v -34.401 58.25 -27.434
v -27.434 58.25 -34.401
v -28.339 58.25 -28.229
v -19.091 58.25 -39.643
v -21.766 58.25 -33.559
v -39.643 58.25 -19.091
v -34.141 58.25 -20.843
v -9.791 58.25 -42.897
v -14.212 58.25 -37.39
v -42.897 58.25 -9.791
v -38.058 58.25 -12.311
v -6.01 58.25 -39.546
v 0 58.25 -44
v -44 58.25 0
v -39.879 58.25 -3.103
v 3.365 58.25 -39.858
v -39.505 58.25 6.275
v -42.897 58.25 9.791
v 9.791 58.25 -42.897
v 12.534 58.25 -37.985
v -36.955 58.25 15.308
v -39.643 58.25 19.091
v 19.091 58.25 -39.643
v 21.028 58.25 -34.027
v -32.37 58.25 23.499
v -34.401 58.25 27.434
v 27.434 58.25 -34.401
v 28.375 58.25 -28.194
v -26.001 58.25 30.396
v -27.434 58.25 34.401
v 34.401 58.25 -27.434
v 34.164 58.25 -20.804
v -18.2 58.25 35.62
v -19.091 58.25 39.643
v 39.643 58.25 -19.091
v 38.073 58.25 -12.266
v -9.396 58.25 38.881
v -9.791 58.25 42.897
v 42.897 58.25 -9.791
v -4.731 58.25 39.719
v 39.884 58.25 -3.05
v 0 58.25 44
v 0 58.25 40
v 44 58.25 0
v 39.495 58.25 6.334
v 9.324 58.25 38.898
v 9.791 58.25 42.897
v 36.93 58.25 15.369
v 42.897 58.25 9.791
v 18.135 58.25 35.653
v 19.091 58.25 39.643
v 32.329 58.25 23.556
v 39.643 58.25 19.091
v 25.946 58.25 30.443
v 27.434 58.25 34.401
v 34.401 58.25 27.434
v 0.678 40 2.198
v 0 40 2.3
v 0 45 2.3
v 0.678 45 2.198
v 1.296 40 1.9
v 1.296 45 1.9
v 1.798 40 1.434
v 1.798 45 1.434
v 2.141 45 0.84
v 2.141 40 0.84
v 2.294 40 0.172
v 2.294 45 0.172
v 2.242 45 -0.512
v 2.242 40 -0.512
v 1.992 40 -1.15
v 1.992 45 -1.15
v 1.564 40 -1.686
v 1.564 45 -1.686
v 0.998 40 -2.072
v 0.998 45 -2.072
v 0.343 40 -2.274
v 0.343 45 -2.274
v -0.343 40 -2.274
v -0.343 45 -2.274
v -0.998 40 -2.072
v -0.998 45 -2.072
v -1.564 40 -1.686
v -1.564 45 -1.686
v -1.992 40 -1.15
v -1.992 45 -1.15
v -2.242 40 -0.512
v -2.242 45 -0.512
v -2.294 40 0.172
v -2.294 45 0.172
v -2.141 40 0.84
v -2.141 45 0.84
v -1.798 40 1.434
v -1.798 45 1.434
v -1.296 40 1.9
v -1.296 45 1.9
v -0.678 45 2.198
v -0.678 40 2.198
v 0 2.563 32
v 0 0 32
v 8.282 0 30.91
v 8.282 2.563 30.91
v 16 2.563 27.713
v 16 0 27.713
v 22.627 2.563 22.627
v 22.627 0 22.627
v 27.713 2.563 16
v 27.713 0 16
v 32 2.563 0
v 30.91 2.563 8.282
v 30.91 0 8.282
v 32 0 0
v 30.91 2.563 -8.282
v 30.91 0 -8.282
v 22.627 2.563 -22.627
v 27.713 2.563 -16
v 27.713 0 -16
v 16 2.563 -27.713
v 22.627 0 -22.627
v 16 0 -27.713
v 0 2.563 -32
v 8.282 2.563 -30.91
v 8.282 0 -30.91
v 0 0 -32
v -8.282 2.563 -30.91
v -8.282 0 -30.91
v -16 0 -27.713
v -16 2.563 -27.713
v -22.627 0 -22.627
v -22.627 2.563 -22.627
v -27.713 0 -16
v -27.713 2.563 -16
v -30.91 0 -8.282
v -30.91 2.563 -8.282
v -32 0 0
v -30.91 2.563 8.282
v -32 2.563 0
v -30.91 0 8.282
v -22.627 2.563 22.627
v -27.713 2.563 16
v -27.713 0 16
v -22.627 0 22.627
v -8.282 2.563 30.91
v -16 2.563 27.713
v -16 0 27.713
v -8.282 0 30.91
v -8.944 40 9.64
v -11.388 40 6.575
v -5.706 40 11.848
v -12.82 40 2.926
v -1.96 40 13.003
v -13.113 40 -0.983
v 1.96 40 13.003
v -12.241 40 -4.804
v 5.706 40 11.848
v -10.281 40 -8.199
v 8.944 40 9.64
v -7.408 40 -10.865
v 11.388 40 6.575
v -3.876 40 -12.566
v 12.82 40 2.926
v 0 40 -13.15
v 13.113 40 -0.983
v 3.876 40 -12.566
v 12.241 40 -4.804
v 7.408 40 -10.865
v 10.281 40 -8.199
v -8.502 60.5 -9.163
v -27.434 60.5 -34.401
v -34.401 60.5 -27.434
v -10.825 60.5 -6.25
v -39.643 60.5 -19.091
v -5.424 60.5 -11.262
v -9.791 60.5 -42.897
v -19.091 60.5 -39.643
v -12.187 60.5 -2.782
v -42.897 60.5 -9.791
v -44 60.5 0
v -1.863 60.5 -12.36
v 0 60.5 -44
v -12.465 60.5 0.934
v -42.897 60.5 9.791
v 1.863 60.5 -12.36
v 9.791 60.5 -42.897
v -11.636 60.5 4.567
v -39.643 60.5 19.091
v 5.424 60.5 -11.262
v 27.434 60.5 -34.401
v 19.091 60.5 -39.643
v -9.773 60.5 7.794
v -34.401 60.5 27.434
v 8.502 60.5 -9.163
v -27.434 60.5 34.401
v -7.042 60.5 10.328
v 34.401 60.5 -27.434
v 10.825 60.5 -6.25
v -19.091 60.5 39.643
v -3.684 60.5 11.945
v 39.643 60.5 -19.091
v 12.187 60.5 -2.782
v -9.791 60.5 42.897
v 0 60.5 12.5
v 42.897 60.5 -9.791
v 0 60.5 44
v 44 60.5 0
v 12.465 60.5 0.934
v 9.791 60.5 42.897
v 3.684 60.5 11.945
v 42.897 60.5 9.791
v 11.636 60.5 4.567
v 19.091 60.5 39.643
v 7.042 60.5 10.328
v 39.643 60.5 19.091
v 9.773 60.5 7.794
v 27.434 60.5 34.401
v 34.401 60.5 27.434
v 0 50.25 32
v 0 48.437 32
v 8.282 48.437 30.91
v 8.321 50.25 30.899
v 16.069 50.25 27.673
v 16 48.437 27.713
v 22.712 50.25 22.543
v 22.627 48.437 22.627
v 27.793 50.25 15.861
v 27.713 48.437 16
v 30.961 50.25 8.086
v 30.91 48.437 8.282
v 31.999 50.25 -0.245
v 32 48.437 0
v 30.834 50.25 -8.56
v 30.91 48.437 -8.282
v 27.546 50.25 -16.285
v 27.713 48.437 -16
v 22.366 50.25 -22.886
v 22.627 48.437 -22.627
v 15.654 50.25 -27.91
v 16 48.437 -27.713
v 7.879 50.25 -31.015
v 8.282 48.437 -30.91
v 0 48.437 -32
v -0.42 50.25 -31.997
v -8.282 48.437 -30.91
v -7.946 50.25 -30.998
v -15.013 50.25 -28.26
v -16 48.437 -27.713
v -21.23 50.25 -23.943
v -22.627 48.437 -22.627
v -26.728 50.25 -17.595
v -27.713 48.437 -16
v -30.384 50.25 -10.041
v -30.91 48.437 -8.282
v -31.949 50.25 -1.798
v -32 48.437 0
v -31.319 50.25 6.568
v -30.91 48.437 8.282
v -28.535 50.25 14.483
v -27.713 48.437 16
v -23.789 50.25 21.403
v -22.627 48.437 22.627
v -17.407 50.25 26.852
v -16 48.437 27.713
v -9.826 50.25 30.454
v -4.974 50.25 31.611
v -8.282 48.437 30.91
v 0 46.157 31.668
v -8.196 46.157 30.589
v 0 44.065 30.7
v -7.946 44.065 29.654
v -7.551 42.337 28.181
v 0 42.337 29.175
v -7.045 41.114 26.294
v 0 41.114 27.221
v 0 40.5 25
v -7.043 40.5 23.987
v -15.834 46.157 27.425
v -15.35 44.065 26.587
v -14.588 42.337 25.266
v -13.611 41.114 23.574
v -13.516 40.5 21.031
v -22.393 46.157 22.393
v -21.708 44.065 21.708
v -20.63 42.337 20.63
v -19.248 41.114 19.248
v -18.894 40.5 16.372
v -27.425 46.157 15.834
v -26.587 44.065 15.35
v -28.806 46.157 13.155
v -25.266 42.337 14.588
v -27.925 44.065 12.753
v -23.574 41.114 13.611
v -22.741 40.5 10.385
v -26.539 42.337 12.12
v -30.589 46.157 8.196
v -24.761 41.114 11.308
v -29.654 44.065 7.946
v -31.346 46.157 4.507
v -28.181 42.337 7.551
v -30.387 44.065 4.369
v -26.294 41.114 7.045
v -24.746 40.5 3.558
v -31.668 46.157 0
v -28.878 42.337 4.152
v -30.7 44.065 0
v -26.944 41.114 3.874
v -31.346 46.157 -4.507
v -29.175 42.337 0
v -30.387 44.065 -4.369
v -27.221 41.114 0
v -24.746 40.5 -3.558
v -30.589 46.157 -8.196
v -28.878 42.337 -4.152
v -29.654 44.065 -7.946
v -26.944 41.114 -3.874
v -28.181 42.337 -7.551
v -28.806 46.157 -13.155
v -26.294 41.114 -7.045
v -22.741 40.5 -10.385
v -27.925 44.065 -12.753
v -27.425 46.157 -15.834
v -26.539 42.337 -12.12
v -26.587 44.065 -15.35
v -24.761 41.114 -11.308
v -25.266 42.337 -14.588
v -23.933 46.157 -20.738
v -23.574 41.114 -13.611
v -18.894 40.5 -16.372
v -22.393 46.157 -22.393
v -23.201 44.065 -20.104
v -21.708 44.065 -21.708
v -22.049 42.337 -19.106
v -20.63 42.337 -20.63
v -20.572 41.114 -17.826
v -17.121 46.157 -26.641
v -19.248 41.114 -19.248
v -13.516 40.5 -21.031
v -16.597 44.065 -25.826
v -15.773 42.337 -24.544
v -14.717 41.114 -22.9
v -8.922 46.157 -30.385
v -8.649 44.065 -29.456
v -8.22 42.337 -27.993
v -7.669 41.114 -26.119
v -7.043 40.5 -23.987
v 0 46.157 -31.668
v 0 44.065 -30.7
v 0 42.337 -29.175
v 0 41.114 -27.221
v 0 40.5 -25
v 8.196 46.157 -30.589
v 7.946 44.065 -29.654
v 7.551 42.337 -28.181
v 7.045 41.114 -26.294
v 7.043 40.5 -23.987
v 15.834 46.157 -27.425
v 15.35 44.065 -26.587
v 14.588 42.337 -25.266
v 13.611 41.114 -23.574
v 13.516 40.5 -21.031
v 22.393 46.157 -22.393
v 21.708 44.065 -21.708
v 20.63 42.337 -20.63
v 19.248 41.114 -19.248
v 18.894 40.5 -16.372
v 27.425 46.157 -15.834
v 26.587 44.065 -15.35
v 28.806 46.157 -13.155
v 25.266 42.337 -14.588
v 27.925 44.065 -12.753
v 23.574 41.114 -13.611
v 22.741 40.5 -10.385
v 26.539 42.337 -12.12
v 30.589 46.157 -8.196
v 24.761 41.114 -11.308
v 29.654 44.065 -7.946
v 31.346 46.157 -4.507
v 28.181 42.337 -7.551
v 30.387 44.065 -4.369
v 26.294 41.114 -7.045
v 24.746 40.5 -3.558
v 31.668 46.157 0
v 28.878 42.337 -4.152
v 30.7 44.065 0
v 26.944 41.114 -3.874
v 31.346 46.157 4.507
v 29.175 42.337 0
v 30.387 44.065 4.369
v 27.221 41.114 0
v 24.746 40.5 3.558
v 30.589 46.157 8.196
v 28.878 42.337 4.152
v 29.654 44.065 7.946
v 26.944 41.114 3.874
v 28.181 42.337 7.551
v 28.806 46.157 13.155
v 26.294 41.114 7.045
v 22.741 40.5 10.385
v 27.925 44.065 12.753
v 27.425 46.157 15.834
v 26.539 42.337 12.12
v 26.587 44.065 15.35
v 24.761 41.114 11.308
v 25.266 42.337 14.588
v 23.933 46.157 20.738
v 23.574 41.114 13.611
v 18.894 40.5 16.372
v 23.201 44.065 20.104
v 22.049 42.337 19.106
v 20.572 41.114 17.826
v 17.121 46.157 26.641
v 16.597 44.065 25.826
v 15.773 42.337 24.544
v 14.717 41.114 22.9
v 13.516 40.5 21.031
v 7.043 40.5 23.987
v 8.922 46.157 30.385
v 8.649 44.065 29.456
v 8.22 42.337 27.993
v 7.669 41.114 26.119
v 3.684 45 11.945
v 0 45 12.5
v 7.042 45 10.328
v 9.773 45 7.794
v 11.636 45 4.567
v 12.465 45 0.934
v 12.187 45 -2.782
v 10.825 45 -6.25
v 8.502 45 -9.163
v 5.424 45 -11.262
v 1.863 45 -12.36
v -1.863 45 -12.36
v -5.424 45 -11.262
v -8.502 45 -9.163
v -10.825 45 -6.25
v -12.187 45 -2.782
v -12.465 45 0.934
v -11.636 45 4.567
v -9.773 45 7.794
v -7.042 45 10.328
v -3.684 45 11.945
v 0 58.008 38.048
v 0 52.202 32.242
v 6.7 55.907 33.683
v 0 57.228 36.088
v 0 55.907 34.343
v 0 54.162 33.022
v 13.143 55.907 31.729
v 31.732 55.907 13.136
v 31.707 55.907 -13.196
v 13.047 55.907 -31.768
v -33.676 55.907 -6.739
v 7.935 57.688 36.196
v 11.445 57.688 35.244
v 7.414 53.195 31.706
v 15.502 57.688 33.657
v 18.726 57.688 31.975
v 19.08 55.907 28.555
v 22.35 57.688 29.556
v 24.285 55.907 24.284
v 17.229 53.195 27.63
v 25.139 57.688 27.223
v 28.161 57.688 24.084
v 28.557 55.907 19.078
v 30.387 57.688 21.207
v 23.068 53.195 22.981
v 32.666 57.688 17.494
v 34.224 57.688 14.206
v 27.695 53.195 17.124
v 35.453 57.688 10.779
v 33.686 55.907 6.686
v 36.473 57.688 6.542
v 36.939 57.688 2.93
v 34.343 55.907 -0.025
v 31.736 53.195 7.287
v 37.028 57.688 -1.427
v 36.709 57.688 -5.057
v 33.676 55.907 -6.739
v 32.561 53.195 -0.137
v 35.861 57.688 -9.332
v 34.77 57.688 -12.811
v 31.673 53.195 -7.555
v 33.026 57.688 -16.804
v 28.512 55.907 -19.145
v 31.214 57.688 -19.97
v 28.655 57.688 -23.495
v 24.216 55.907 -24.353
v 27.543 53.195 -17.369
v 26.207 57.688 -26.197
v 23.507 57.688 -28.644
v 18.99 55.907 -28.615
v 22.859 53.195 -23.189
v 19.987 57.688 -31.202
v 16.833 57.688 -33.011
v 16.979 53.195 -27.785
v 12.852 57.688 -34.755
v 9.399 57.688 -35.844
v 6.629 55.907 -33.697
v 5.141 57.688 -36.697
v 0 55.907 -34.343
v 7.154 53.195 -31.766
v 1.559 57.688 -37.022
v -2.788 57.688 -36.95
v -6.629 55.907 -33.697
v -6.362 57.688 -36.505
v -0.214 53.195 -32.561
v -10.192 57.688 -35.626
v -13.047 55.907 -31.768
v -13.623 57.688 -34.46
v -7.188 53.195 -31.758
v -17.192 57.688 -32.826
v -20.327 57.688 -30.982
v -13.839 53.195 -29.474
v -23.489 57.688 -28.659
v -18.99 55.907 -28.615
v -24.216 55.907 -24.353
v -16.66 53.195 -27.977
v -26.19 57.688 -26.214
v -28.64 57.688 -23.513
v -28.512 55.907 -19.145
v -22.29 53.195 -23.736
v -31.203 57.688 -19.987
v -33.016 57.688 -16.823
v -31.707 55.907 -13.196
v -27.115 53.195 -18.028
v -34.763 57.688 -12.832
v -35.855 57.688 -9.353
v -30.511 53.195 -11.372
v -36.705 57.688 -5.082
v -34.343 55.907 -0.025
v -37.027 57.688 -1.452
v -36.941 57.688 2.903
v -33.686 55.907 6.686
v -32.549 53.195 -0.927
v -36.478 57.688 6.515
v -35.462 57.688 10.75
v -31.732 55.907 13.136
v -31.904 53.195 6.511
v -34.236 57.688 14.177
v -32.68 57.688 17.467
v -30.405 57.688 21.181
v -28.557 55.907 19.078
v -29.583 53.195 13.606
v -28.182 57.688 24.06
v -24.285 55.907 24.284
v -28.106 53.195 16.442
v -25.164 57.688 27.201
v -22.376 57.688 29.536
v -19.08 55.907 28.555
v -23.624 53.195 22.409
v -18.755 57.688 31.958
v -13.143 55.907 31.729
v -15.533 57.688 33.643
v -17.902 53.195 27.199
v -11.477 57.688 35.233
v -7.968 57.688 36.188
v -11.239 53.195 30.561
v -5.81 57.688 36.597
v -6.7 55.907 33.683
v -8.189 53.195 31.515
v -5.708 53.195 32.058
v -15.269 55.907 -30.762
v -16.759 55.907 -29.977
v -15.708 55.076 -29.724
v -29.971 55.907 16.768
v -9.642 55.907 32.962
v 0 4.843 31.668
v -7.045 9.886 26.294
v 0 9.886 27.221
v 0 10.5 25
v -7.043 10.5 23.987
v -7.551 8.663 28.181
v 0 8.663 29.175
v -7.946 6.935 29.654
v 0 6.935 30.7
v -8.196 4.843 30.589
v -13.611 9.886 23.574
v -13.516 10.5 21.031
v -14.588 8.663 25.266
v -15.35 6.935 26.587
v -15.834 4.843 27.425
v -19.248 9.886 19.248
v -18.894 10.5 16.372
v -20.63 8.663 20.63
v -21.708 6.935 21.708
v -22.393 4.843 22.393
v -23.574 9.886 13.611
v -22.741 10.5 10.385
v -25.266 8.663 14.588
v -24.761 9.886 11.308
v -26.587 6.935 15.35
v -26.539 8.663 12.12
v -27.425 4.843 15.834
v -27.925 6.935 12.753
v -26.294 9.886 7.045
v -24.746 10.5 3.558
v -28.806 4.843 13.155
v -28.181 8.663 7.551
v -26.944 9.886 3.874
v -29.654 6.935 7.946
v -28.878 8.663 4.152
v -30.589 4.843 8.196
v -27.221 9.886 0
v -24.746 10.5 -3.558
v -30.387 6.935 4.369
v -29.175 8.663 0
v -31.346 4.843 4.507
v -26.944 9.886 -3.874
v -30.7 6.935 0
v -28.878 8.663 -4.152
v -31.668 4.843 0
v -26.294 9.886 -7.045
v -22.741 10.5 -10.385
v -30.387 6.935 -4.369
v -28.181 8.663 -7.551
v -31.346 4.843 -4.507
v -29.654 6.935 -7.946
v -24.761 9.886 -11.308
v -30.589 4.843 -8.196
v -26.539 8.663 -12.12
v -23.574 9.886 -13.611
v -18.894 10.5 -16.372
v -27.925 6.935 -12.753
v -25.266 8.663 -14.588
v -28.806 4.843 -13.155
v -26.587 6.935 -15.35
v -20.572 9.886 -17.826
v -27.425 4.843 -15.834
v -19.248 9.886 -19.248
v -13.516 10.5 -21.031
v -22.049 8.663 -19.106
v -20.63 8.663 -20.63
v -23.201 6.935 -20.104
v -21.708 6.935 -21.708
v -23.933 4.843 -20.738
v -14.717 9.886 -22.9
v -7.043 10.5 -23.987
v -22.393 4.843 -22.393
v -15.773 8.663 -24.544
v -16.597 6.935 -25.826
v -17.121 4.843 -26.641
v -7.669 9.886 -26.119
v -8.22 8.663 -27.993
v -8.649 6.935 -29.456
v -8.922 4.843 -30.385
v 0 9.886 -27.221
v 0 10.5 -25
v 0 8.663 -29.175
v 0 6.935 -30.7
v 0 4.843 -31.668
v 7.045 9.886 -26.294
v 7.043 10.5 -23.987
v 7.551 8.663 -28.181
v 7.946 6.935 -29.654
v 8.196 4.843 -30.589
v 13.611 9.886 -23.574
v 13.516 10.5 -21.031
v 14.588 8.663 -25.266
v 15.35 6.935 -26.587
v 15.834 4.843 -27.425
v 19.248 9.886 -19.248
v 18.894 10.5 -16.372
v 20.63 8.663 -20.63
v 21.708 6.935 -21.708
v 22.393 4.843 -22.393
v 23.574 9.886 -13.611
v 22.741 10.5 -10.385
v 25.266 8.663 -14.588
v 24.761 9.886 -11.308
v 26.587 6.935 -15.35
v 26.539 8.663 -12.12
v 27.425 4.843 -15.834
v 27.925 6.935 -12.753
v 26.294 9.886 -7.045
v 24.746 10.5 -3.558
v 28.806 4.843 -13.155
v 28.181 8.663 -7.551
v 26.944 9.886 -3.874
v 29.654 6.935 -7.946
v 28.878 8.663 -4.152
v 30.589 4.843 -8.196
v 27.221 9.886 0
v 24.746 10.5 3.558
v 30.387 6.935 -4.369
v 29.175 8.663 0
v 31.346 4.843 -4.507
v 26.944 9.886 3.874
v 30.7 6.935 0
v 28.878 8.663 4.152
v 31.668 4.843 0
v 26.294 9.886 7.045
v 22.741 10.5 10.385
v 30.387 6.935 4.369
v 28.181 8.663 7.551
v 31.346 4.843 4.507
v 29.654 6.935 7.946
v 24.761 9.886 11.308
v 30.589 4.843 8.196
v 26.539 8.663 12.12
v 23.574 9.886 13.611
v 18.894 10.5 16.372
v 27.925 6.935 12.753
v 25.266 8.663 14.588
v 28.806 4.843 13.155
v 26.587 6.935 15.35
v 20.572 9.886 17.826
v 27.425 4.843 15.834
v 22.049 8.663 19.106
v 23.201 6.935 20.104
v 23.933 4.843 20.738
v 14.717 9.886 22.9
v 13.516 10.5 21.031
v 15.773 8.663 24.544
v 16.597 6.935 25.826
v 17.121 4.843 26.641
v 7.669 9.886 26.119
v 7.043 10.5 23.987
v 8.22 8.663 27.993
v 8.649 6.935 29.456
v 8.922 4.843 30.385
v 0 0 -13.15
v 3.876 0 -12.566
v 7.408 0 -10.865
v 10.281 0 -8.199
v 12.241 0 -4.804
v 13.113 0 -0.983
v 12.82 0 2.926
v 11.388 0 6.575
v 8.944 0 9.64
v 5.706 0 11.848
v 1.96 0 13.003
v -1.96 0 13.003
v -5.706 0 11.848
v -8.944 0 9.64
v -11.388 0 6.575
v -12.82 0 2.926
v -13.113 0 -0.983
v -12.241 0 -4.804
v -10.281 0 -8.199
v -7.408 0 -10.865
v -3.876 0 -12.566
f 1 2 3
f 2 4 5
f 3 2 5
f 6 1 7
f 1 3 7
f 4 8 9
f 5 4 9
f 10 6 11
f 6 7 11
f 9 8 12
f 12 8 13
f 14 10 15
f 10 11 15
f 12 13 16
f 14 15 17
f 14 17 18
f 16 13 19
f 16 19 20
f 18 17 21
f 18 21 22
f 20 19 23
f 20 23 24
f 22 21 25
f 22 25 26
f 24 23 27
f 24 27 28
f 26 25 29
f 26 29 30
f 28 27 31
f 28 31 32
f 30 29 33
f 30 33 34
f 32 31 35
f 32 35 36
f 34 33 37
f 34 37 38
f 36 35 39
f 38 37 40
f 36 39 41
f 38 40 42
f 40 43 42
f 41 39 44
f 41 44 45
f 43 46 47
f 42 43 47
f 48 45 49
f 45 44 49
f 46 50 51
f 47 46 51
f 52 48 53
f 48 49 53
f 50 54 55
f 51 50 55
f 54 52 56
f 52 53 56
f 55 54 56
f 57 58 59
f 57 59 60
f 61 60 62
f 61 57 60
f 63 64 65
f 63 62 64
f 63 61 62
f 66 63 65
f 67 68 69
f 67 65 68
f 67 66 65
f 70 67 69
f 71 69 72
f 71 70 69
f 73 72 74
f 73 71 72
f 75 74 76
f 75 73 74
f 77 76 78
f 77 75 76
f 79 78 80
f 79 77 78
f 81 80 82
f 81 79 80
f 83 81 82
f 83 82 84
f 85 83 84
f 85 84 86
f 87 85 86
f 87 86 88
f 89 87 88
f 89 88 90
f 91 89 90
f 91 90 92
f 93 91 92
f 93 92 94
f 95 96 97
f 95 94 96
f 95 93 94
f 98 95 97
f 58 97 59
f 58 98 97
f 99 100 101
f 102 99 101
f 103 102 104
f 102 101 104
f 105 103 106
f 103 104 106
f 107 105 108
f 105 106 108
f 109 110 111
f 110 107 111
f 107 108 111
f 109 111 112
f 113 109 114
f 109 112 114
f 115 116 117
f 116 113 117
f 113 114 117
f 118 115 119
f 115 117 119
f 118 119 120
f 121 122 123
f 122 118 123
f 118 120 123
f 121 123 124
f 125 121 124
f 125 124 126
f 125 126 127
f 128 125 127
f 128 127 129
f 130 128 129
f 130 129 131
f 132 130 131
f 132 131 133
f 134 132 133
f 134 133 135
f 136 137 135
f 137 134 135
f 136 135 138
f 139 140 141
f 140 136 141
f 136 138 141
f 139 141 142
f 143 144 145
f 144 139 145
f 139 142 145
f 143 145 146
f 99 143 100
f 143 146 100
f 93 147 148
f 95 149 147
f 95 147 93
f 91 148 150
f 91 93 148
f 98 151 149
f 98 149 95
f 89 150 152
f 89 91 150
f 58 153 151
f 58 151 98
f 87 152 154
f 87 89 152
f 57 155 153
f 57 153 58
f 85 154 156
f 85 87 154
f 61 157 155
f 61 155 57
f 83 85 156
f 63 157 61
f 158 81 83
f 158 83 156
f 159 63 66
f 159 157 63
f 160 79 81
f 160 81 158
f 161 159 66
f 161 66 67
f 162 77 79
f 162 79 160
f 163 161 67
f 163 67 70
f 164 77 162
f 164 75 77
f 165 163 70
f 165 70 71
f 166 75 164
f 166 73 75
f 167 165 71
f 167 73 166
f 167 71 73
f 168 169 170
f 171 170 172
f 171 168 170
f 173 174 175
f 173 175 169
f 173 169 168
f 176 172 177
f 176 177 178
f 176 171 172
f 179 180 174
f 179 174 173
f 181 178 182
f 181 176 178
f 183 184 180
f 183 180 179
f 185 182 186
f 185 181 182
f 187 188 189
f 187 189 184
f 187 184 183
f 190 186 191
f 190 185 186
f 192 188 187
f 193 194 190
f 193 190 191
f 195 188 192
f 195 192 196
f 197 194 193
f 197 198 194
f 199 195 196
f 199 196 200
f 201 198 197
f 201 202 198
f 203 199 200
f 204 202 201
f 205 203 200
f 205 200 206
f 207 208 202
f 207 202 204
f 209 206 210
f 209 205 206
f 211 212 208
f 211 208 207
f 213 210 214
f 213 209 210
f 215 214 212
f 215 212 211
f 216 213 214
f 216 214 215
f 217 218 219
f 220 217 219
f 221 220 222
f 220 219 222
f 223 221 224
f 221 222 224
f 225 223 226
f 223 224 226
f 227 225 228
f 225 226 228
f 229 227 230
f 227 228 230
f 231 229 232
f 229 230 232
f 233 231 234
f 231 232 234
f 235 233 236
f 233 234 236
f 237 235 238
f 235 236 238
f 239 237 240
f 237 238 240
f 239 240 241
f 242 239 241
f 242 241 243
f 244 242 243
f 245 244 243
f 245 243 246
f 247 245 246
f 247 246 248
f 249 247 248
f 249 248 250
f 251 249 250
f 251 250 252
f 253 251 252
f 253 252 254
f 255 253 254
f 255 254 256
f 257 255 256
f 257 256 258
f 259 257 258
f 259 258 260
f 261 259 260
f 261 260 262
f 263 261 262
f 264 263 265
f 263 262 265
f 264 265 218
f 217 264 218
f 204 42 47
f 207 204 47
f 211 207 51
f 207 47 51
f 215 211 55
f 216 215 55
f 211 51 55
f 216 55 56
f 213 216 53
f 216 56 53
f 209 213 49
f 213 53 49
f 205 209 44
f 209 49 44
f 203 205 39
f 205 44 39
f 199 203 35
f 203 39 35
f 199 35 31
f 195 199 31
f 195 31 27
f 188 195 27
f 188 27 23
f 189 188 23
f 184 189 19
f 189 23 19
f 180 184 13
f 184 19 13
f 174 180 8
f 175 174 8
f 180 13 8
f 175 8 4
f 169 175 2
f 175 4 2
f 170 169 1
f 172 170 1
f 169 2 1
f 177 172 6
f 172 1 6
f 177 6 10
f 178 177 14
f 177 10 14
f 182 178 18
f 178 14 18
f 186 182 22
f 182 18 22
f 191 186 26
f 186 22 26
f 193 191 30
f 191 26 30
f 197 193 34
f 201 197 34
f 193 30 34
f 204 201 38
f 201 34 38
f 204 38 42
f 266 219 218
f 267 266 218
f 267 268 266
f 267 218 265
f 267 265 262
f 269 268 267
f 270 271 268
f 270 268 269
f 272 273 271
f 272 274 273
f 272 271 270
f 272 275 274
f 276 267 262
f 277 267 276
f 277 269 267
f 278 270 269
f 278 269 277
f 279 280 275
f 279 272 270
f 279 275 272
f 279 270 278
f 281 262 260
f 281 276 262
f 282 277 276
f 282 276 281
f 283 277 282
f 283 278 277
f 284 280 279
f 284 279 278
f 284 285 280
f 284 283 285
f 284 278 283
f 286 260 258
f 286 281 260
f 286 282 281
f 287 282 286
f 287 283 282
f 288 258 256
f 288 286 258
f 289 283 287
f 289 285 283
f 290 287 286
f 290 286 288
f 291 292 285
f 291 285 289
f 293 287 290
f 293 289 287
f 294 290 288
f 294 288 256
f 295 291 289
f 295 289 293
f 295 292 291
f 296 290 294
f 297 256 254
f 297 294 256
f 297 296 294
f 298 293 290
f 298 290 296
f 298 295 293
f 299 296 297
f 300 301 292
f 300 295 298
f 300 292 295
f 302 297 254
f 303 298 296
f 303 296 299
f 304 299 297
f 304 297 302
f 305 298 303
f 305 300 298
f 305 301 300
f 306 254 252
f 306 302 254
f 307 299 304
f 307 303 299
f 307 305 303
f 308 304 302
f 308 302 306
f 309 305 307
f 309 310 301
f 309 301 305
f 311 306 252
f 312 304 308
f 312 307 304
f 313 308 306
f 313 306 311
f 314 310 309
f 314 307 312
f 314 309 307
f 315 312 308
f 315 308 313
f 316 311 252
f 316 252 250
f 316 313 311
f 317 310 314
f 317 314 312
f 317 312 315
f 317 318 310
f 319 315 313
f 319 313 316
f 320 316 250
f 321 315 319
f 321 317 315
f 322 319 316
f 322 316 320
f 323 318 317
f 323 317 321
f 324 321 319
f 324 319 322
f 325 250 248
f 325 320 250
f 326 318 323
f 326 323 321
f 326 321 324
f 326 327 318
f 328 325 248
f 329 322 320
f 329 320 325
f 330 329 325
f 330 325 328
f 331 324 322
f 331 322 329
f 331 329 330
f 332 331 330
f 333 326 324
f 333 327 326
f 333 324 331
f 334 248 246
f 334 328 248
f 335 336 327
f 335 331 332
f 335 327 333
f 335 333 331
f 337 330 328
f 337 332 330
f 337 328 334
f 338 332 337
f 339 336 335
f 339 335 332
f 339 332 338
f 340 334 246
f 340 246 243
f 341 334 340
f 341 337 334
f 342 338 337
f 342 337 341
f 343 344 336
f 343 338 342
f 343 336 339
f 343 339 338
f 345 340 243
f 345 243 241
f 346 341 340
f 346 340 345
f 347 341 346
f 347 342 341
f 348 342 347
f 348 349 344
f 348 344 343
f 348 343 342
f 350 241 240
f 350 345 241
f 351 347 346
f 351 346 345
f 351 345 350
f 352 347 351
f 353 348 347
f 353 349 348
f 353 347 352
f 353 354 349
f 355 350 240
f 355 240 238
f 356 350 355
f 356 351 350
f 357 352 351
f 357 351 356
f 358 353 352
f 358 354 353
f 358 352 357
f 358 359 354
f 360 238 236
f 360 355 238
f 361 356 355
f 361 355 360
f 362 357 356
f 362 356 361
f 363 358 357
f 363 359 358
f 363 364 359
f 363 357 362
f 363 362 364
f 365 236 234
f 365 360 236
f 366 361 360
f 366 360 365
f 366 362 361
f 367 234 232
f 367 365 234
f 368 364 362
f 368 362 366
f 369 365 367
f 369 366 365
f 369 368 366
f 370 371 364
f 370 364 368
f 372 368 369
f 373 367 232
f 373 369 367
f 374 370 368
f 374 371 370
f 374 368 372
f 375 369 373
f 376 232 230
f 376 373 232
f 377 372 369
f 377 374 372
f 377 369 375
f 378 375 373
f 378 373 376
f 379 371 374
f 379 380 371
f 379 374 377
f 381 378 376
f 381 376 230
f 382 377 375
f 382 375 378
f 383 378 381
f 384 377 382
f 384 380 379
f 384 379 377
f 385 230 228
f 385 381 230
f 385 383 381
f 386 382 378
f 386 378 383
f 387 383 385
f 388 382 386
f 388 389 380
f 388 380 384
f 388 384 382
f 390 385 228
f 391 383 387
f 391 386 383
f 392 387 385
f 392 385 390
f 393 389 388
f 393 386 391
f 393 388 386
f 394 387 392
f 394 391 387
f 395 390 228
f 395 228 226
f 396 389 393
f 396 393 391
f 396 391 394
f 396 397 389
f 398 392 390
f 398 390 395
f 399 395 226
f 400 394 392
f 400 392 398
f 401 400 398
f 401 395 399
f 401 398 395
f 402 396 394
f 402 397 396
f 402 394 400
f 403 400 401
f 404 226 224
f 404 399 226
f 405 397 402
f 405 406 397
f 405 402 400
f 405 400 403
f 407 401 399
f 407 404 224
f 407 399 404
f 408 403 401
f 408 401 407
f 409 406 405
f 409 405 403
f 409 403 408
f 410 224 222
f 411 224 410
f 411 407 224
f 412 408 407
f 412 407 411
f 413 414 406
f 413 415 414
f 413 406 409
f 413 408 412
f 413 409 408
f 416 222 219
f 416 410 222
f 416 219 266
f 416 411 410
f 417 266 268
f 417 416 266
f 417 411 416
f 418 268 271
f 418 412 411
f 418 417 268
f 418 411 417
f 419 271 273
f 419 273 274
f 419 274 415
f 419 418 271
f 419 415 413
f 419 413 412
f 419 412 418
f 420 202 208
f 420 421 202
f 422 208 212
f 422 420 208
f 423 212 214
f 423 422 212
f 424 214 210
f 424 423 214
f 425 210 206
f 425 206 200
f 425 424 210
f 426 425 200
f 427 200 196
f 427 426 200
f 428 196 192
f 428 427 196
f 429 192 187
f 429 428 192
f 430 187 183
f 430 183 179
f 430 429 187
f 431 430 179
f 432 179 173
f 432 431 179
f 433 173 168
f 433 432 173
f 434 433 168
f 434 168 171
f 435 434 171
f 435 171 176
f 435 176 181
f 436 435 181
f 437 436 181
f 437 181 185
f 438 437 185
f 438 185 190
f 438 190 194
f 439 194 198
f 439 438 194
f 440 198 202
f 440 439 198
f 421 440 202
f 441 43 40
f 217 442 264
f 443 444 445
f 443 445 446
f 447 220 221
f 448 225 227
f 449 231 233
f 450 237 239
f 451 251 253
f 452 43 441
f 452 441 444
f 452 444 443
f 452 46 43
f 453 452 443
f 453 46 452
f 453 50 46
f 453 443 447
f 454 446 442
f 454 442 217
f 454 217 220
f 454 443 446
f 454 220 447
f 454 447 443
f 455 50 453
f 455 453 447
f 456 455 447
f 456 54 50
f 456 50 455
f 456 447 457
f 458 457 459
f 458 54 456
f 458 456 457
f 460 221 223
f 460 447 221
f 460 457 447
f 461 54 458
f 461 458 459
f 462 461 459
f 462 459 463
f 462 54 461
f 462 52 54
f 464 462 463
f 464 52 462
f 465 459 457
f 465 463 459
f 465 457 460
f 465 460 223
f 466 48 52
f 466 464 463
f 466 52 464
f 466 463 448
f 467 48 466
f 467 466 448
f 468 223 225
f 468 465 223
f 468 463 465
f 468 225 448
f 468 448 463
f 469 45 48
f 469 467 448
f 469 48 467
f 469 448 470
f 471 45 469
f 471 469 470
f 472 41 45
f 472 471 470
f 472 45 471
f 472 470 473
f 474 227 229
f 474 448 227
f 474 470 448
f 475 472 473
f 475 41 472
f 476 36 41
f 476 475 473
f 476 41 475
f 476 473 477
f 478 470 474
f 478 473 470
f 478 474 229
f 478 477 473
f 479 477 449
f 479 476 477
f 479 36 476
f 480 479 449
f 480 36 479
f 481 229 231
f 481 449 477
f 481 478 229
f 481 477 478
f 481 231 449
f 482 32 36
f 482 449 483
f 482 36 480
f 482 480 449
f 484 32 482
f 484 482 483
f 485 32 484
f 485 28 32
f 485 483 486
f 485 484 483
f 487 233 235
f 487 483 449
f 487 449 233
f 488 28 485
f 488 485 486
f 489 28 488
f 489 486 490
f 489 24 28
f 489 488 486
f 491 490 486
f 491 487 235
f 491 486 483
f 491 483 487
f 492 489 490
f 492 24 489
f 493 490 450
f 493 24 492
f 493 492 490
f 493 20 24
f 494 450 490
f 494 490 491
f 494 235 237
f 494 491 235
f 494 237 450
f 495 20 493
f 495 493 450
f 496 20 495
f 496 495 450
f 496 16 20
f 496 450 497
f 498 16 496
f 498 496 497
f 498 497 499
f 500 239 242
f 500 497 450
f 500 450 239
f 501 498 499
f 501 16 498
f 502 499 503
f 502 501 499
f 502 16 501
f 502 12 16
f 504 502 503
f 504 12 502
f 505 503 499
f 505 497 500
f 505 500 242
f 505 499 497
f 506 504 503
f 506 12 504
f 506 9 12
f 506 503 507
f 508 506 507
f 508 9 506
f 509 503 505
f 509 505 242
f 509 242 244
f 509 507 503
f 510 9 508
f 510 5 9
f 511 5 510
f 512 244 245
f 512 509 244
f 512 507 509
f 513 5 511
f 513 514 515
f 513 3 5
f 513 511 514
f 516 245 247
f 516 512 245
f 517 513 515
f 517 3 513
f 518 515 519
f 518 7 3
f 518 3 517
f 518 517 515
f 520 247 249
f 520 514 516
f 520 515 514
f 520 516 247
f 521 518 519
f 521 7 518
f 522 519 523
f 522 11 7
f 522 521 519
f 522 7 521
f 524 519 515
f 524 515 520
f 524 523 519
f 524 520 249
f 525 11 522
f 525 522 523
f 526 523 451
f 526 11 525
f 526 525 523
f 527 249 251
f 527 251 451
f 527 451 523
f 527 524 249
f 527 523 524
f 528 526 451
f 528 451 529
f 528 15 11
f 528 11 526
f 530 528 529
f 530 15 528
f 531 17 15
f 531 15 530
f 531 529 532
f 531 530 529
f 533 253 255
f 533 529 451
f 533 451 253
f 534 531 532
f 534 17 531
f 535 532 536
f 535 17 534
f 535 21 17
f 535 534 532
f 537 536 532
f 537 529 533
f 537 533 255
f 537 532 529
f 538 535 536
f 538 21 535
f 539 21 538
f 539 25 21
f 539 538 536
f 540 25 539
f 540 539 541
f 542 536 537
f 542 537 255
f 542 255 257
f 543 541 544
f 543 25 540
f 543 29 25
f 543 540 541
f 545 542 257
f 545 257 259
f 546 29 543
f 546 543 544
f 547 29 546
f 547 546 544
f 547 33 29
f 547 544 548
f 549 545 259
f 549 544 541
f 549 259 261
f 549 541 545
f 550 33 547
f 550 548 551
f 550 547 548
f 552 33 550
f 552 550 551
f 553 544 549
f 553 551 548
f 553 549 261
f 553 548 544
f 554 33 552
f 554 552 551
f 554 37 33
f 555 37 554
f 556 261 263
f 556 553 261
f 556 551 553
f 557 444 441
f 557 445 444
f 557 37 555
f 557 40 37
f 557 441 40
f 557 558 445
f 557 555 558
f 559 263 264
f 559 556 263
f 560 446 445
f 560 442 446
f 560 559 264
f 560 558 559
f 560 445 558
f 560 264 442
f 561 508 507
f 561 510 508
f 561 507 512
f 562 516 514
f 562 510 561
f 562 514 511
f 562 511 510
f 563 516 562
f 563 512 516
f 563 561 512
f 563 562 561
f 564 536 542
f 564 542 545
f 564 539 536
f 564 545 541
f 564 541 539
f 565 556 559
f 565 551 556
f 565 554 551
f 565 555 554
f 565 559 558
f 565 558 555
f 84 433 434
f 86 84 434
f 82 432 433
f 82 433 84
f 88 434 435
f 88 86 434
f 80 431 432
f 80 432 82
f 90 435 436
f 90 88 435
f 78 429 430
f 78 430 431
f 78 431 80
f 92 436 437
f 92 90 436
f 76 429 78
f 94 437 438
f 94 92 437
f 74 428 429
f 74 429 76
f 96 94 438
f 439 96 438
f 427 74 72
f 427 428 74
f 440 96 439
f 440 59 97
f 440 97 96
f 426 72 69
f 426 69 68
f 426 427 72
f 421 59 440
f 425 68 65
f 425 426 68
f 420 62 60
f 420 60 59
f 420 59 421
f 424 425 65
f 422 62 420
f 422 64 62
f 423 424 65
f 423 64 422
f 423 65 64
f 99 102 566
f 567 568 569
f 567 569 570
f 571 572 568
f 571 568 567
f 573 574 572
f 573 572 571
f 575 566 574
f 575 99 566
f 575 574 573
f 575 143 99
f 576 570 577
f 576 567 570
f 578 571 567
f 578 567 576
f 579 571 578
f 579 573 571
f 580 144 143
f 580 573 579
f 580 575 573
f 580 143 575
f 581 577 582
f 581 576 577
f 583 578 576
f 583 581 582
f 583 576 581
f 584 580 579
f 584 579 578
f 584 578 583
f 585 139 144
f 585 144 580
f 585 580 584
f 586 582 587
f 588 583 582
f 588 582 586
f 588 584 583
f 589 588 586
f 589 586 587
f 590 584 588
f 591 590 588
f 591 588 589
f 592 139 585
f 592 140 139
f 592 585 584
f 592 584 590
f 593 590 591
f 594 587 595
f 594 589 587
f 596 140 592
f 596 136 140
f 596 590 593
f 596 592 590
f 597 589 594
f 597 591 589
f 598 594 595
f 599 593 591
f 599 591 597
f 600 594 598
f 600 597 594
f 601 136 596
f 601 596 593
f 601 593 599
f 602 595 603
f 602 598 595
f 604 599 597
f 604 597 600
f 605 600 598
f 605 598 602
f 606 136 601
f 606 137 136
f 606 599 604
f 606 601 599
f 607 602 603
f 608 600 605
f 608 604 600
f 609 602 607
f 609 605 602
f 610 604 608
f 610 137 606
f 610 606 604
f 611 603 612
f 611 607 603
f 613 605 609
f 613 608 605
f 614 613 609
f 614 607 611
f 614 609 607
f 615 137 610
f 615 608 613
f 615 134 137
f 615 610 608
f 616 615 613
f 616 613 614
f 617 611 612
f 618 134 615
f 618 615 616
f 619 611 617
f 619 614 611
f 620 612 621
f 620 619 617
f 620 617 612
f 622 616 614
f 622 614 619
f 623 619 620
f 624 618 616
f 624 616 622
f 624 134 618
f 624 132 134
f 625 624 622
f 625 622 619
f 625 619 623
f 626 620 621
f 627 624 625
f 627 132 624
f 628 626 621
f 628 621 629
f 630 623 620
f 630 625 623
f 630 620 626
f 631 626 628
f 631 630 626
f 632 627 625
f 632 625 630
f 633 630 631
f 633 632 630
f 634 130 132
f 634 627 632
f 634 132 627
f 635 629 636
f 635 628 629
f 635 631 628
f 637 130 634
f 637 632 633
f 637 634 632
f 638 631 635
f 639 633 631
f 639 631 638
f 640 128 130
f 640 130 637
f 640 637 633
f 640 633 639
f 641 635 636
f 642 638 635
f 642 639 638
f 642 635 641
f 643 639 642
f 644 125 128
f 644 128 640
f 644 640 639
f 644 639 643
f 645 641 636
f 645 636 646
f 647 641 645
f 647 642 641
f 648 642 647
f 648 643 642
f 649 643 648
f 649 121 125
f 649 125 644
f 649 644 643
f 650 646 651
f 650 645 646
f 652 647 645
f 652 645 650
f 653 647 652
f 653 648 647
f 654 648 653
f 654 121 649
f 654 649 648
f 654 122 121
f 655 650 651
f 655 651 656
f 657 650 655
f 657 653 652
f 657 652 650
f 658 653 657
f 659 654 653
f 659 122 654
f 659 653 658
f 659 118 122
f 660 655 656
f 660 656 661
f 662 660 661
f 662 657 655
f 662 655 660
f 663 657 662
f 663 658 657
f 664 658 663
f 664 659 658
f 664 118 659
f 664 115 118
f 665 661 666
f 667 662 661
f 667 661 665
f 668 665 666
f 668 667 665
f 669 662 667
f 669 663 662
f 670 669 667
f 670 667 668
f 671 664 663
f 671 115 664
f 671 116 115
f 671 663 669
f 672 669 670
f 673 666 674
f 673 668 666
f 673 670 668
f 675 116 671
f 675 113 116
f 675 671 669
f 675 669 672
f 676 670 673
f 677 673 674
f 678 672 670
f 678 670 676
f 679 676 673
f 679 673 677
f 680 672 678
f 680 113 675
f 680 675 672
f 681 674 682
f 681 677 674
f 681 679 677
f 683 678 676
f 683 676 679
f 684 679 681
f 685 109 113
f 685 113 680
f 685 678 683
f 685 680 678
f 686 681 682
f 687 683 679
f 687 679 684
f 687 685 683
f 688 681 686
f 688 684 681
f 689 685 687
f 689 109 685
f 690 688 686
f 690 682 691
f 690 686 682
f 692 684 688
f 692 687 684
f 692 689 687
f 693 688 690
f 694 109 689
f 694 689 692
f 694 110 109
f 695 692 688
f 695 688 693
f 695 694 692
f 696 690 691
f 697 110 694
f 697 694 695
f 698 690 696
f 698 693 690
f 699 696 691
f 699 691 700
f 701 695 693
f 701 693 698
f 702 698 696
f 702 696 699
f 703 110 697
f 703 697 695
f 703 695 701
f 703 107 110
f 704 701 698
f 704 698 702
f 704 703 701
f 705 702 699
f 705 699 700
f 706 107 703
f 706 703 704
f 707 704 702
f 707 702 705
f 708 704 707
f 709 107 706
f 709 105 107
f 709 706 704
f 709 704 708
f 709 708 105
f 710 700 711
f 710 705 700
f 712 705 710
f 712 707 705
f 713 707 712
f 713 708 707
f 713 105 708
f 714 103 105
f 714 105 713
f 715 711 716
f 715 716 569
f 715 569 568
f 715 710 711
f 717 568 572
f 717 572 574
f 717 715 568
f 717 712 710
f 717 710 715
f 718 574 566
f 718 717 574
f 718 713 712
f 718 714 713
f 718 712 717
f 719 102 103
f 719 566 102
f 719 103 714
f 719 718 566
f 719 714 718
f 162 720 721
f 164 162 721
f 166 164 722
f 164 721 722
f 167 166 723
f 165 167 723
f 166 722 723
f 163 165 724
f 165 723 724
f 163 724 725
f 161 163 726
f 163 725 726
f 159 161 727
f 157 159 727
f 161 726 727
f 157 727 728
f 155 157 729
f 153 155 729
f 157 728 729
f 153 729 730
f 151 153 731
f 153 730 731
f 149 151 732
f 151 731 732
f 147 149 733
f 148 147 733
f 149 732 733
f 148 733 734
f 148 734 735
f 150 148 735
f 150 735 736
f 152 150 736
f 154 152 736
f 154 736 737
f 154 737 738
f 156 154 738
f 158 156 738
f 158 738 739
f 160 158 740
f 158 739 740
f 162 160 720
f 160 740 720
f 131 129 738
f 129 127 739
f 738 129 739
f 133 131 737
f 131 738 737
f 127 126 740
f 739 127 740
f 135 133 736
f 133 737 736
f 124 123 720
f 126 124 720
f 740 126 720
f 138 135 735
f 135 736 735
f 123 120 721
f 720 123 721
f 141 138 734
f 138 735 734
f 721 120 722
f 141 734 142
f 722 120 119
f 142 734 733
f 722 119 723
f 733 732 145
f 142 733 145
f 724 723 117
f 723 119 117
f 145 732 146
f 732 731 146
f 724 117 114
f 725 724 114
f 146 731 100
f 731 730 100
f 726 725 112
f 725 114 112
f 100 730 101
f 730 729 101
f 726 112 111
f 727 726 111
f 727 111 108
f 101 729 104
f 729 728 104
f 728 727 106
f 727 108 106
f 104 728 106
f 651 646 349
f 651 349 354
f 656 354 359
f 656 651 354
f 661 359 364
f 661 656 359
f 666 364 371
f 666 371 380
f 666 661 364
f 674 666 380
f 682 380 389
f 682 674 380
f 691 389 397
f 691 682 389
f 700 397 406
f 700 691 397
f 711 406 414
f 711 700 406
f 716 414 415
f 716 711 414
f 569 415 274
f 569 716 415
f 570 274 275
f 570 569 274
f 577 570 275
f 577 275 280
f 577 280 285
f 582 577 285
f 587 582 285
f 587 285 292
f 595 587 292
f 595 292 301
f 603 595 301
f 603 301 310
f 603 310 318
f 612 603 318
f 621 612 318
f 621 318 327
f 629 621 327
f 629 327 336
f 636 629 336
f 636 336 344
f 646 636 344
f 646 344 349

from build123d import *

# Parameters (mm, degrees)
SKETCH_1_R          = 32
SKETCH_1_R_2        = 2.3
EXTRUDE_1_DEPTH     = 51
SKETCH_2_R          = 13.15
CUT_EXTRUDE_1_DEPTH = 40
CUT_EXTRUDE_START   = -10.5
SKETCH_16_R         = 36.699938781
SKETCH_16_R_2       = 25
CUT_EXTRUDE_5_DEPTH = 30
FILLET_4_R          = 8
SKETCH_17_R         = 12.5
CUT_EXTRUDE_6_DEPTH = 6
SKETCH_18_R         = 32
SKETCH_18_R_2       = 12.5
EXTRUDE_2_DEPTH     = 7.25
SKETCH_19_R         = 44
SKETCH_19_R_2       = 12.5
EXTRUDE_3_DEPTH     = 2.25
FILLET_5_R          = 8


with BuildPart() as part:
    # Эскиз1 → Бобышка-Вытянуть1 (new body)
    with BuildSketch(Plane(origin=(0, 0, 0), x_dir=(1, 0, 0), z_dir=(0, 1, 0))):
        with Locations(Location((0, 0, 0), (0, 0, 270))):
            Circle(SKETCH_1_R)
        with Locations(Location((0, 0, 0), (0, 0, 270))):
            Circle(SKETCH_1_R_2, mode=Mode.SUBTRACT)
    extrude(amount=EXTRUDE_1_DEPTH)

    # Эскиз2 → Вырез-Вытянуть1 (cut)
    with BuildSketch(Plane.XZ):
        with Locations(Location((0, 0, 0), (0, 0, 270))):
            Circle(SKETCH_2_R)
    extrude(amount=-CUT_EXTRUDE_1_DEPTH, mode=Mode.SUBTRACT)

    # Эскиз16 → Вырез-Вытянуть5 (cut)
    with BuildSketch(Plane.XZ.offset(CUT_EXTRUDE_START)):
        Circle(SKETCH_16_R)
        with Locations(Location((0, 0, 0), (0, 0, 270))):
            Circle(SKETCH_16_R_2, mode=Mode.SUBTRACT)
    extrude(amount=-CUT_EXTRUDE_5_DEPTH, mode=Mode.SUBTRACT)

    # Скругление4
    # the kernel refuses this fillet: 8 mm, written as the material it takes off along each edge
    with BuildSketch(Plane(origin=(0, 10.5, 0), x_dir=(0, 0, 1), z_dir=(1, 0, 0))) as fillet_4_piece_1:
        with BuildLine():
            CenterArc((24, 7.937253933), FILLET_4_R, 277.180755781, 82.819244219)
            Line((25, 0), (25.02, -0.158745079))
            ThreePointArc((25.02, -0.158745079), (28.5, -0.16), (32, -0.16))
            Line((32, -0.16), (32.16, 0))
            Line((32.16, 0), (32.16, 7.937253933))
            Line((32.16, 7.937253933), (32, 7.937253933))
        make_face()
    revolve(axis=Axis((0, 10.5, 0), (0, -1, 0)), mode=Mode.SUBTRACT)
    with BuildSketch(Plane(origin=(0, 40.5, 0), x_dir=(0, 0, 1), z_dir=(1, 0, 0))) as fillet_4_piece_2:
        with BuildLine():
            CenterArc((24, -7.937253933), FILLET_4_R, 0, 82.819244219)
            Line((32, -7.937253933), (32.16, -7.937253933))
            Line((32.16, -7.937253933), (32.16, 0))
            Line((32.16, 0), (32, 0.16))
            ThreePointArc((32, 0.16), (28.5, 0.16), (25.02, 0.158745079))
            Line((25.02, 0.158745079), (25, 0))
        make_face()
    revolve(axis=Axis((0, 40.5, 0), (0, -1, 0)), mode=Mode.SUBTRACT)

    # Эскиз17 → Вырез-Вытянуть6 (cut)
    with BuildSketch(Plane(origin=(0, 51, 0), x_dir=(1, 0, 0), z_dir=(0, 1, 0))):
        with Locations(Location((0, 0, 0), (0, 0, 270))):
            Circle(SKETCH_17_R)
    extrude(amount=-CUT_EXTRUDE_6_DEPTH, mode=Mode.SUBTRACT)

    # Эскиз18 → Бобышка-Вытянуть2 (add)
    with BuildSketch(Plane(origin=(0, 51, 0), x_dir=(1, 0, 0), z_dir=(0, 1, 0))):
        with Locations(Location((0, 0, 0), (0, 0, 90))):
            Circle(SKETCH_18_R)
        with Locations(Location((0, 0, 0), (0, 0, 270))):
            Circle(SKETCH_18_R_2, mode=Mode.SUBTRACT)
    extrude(amount=EXTRUDE_2_DEPTH)

    # Эскиз19 → Бобышка-Вытянуть3 (add)
    with BuildSketch(Plane(origin=(0, 58.25, 0), x_dir=(1, 0, 0), z_dir=(0, 1, 0))):
        with Locations(Location((0, 0, 0), (0, 0, 270))):
            Circle(SKETCH_19_R)
        with Locations(Location((0, 0, 0), (0, 0, 270))):
            Circle(SKETCH_19_R_2, mode=Mode.SUBTRACT)
    extrude(amount=EXTRUDE_3_DEPTH)

    # Скругление5
    fillet_5_edges = [part.edges().sort_by_distance(p)[0] for p in [
        (0, 58.25, 32),
    ]]
    fillet(fillet_5_edges, radius=FILLET_5_R)


solid = part.part
